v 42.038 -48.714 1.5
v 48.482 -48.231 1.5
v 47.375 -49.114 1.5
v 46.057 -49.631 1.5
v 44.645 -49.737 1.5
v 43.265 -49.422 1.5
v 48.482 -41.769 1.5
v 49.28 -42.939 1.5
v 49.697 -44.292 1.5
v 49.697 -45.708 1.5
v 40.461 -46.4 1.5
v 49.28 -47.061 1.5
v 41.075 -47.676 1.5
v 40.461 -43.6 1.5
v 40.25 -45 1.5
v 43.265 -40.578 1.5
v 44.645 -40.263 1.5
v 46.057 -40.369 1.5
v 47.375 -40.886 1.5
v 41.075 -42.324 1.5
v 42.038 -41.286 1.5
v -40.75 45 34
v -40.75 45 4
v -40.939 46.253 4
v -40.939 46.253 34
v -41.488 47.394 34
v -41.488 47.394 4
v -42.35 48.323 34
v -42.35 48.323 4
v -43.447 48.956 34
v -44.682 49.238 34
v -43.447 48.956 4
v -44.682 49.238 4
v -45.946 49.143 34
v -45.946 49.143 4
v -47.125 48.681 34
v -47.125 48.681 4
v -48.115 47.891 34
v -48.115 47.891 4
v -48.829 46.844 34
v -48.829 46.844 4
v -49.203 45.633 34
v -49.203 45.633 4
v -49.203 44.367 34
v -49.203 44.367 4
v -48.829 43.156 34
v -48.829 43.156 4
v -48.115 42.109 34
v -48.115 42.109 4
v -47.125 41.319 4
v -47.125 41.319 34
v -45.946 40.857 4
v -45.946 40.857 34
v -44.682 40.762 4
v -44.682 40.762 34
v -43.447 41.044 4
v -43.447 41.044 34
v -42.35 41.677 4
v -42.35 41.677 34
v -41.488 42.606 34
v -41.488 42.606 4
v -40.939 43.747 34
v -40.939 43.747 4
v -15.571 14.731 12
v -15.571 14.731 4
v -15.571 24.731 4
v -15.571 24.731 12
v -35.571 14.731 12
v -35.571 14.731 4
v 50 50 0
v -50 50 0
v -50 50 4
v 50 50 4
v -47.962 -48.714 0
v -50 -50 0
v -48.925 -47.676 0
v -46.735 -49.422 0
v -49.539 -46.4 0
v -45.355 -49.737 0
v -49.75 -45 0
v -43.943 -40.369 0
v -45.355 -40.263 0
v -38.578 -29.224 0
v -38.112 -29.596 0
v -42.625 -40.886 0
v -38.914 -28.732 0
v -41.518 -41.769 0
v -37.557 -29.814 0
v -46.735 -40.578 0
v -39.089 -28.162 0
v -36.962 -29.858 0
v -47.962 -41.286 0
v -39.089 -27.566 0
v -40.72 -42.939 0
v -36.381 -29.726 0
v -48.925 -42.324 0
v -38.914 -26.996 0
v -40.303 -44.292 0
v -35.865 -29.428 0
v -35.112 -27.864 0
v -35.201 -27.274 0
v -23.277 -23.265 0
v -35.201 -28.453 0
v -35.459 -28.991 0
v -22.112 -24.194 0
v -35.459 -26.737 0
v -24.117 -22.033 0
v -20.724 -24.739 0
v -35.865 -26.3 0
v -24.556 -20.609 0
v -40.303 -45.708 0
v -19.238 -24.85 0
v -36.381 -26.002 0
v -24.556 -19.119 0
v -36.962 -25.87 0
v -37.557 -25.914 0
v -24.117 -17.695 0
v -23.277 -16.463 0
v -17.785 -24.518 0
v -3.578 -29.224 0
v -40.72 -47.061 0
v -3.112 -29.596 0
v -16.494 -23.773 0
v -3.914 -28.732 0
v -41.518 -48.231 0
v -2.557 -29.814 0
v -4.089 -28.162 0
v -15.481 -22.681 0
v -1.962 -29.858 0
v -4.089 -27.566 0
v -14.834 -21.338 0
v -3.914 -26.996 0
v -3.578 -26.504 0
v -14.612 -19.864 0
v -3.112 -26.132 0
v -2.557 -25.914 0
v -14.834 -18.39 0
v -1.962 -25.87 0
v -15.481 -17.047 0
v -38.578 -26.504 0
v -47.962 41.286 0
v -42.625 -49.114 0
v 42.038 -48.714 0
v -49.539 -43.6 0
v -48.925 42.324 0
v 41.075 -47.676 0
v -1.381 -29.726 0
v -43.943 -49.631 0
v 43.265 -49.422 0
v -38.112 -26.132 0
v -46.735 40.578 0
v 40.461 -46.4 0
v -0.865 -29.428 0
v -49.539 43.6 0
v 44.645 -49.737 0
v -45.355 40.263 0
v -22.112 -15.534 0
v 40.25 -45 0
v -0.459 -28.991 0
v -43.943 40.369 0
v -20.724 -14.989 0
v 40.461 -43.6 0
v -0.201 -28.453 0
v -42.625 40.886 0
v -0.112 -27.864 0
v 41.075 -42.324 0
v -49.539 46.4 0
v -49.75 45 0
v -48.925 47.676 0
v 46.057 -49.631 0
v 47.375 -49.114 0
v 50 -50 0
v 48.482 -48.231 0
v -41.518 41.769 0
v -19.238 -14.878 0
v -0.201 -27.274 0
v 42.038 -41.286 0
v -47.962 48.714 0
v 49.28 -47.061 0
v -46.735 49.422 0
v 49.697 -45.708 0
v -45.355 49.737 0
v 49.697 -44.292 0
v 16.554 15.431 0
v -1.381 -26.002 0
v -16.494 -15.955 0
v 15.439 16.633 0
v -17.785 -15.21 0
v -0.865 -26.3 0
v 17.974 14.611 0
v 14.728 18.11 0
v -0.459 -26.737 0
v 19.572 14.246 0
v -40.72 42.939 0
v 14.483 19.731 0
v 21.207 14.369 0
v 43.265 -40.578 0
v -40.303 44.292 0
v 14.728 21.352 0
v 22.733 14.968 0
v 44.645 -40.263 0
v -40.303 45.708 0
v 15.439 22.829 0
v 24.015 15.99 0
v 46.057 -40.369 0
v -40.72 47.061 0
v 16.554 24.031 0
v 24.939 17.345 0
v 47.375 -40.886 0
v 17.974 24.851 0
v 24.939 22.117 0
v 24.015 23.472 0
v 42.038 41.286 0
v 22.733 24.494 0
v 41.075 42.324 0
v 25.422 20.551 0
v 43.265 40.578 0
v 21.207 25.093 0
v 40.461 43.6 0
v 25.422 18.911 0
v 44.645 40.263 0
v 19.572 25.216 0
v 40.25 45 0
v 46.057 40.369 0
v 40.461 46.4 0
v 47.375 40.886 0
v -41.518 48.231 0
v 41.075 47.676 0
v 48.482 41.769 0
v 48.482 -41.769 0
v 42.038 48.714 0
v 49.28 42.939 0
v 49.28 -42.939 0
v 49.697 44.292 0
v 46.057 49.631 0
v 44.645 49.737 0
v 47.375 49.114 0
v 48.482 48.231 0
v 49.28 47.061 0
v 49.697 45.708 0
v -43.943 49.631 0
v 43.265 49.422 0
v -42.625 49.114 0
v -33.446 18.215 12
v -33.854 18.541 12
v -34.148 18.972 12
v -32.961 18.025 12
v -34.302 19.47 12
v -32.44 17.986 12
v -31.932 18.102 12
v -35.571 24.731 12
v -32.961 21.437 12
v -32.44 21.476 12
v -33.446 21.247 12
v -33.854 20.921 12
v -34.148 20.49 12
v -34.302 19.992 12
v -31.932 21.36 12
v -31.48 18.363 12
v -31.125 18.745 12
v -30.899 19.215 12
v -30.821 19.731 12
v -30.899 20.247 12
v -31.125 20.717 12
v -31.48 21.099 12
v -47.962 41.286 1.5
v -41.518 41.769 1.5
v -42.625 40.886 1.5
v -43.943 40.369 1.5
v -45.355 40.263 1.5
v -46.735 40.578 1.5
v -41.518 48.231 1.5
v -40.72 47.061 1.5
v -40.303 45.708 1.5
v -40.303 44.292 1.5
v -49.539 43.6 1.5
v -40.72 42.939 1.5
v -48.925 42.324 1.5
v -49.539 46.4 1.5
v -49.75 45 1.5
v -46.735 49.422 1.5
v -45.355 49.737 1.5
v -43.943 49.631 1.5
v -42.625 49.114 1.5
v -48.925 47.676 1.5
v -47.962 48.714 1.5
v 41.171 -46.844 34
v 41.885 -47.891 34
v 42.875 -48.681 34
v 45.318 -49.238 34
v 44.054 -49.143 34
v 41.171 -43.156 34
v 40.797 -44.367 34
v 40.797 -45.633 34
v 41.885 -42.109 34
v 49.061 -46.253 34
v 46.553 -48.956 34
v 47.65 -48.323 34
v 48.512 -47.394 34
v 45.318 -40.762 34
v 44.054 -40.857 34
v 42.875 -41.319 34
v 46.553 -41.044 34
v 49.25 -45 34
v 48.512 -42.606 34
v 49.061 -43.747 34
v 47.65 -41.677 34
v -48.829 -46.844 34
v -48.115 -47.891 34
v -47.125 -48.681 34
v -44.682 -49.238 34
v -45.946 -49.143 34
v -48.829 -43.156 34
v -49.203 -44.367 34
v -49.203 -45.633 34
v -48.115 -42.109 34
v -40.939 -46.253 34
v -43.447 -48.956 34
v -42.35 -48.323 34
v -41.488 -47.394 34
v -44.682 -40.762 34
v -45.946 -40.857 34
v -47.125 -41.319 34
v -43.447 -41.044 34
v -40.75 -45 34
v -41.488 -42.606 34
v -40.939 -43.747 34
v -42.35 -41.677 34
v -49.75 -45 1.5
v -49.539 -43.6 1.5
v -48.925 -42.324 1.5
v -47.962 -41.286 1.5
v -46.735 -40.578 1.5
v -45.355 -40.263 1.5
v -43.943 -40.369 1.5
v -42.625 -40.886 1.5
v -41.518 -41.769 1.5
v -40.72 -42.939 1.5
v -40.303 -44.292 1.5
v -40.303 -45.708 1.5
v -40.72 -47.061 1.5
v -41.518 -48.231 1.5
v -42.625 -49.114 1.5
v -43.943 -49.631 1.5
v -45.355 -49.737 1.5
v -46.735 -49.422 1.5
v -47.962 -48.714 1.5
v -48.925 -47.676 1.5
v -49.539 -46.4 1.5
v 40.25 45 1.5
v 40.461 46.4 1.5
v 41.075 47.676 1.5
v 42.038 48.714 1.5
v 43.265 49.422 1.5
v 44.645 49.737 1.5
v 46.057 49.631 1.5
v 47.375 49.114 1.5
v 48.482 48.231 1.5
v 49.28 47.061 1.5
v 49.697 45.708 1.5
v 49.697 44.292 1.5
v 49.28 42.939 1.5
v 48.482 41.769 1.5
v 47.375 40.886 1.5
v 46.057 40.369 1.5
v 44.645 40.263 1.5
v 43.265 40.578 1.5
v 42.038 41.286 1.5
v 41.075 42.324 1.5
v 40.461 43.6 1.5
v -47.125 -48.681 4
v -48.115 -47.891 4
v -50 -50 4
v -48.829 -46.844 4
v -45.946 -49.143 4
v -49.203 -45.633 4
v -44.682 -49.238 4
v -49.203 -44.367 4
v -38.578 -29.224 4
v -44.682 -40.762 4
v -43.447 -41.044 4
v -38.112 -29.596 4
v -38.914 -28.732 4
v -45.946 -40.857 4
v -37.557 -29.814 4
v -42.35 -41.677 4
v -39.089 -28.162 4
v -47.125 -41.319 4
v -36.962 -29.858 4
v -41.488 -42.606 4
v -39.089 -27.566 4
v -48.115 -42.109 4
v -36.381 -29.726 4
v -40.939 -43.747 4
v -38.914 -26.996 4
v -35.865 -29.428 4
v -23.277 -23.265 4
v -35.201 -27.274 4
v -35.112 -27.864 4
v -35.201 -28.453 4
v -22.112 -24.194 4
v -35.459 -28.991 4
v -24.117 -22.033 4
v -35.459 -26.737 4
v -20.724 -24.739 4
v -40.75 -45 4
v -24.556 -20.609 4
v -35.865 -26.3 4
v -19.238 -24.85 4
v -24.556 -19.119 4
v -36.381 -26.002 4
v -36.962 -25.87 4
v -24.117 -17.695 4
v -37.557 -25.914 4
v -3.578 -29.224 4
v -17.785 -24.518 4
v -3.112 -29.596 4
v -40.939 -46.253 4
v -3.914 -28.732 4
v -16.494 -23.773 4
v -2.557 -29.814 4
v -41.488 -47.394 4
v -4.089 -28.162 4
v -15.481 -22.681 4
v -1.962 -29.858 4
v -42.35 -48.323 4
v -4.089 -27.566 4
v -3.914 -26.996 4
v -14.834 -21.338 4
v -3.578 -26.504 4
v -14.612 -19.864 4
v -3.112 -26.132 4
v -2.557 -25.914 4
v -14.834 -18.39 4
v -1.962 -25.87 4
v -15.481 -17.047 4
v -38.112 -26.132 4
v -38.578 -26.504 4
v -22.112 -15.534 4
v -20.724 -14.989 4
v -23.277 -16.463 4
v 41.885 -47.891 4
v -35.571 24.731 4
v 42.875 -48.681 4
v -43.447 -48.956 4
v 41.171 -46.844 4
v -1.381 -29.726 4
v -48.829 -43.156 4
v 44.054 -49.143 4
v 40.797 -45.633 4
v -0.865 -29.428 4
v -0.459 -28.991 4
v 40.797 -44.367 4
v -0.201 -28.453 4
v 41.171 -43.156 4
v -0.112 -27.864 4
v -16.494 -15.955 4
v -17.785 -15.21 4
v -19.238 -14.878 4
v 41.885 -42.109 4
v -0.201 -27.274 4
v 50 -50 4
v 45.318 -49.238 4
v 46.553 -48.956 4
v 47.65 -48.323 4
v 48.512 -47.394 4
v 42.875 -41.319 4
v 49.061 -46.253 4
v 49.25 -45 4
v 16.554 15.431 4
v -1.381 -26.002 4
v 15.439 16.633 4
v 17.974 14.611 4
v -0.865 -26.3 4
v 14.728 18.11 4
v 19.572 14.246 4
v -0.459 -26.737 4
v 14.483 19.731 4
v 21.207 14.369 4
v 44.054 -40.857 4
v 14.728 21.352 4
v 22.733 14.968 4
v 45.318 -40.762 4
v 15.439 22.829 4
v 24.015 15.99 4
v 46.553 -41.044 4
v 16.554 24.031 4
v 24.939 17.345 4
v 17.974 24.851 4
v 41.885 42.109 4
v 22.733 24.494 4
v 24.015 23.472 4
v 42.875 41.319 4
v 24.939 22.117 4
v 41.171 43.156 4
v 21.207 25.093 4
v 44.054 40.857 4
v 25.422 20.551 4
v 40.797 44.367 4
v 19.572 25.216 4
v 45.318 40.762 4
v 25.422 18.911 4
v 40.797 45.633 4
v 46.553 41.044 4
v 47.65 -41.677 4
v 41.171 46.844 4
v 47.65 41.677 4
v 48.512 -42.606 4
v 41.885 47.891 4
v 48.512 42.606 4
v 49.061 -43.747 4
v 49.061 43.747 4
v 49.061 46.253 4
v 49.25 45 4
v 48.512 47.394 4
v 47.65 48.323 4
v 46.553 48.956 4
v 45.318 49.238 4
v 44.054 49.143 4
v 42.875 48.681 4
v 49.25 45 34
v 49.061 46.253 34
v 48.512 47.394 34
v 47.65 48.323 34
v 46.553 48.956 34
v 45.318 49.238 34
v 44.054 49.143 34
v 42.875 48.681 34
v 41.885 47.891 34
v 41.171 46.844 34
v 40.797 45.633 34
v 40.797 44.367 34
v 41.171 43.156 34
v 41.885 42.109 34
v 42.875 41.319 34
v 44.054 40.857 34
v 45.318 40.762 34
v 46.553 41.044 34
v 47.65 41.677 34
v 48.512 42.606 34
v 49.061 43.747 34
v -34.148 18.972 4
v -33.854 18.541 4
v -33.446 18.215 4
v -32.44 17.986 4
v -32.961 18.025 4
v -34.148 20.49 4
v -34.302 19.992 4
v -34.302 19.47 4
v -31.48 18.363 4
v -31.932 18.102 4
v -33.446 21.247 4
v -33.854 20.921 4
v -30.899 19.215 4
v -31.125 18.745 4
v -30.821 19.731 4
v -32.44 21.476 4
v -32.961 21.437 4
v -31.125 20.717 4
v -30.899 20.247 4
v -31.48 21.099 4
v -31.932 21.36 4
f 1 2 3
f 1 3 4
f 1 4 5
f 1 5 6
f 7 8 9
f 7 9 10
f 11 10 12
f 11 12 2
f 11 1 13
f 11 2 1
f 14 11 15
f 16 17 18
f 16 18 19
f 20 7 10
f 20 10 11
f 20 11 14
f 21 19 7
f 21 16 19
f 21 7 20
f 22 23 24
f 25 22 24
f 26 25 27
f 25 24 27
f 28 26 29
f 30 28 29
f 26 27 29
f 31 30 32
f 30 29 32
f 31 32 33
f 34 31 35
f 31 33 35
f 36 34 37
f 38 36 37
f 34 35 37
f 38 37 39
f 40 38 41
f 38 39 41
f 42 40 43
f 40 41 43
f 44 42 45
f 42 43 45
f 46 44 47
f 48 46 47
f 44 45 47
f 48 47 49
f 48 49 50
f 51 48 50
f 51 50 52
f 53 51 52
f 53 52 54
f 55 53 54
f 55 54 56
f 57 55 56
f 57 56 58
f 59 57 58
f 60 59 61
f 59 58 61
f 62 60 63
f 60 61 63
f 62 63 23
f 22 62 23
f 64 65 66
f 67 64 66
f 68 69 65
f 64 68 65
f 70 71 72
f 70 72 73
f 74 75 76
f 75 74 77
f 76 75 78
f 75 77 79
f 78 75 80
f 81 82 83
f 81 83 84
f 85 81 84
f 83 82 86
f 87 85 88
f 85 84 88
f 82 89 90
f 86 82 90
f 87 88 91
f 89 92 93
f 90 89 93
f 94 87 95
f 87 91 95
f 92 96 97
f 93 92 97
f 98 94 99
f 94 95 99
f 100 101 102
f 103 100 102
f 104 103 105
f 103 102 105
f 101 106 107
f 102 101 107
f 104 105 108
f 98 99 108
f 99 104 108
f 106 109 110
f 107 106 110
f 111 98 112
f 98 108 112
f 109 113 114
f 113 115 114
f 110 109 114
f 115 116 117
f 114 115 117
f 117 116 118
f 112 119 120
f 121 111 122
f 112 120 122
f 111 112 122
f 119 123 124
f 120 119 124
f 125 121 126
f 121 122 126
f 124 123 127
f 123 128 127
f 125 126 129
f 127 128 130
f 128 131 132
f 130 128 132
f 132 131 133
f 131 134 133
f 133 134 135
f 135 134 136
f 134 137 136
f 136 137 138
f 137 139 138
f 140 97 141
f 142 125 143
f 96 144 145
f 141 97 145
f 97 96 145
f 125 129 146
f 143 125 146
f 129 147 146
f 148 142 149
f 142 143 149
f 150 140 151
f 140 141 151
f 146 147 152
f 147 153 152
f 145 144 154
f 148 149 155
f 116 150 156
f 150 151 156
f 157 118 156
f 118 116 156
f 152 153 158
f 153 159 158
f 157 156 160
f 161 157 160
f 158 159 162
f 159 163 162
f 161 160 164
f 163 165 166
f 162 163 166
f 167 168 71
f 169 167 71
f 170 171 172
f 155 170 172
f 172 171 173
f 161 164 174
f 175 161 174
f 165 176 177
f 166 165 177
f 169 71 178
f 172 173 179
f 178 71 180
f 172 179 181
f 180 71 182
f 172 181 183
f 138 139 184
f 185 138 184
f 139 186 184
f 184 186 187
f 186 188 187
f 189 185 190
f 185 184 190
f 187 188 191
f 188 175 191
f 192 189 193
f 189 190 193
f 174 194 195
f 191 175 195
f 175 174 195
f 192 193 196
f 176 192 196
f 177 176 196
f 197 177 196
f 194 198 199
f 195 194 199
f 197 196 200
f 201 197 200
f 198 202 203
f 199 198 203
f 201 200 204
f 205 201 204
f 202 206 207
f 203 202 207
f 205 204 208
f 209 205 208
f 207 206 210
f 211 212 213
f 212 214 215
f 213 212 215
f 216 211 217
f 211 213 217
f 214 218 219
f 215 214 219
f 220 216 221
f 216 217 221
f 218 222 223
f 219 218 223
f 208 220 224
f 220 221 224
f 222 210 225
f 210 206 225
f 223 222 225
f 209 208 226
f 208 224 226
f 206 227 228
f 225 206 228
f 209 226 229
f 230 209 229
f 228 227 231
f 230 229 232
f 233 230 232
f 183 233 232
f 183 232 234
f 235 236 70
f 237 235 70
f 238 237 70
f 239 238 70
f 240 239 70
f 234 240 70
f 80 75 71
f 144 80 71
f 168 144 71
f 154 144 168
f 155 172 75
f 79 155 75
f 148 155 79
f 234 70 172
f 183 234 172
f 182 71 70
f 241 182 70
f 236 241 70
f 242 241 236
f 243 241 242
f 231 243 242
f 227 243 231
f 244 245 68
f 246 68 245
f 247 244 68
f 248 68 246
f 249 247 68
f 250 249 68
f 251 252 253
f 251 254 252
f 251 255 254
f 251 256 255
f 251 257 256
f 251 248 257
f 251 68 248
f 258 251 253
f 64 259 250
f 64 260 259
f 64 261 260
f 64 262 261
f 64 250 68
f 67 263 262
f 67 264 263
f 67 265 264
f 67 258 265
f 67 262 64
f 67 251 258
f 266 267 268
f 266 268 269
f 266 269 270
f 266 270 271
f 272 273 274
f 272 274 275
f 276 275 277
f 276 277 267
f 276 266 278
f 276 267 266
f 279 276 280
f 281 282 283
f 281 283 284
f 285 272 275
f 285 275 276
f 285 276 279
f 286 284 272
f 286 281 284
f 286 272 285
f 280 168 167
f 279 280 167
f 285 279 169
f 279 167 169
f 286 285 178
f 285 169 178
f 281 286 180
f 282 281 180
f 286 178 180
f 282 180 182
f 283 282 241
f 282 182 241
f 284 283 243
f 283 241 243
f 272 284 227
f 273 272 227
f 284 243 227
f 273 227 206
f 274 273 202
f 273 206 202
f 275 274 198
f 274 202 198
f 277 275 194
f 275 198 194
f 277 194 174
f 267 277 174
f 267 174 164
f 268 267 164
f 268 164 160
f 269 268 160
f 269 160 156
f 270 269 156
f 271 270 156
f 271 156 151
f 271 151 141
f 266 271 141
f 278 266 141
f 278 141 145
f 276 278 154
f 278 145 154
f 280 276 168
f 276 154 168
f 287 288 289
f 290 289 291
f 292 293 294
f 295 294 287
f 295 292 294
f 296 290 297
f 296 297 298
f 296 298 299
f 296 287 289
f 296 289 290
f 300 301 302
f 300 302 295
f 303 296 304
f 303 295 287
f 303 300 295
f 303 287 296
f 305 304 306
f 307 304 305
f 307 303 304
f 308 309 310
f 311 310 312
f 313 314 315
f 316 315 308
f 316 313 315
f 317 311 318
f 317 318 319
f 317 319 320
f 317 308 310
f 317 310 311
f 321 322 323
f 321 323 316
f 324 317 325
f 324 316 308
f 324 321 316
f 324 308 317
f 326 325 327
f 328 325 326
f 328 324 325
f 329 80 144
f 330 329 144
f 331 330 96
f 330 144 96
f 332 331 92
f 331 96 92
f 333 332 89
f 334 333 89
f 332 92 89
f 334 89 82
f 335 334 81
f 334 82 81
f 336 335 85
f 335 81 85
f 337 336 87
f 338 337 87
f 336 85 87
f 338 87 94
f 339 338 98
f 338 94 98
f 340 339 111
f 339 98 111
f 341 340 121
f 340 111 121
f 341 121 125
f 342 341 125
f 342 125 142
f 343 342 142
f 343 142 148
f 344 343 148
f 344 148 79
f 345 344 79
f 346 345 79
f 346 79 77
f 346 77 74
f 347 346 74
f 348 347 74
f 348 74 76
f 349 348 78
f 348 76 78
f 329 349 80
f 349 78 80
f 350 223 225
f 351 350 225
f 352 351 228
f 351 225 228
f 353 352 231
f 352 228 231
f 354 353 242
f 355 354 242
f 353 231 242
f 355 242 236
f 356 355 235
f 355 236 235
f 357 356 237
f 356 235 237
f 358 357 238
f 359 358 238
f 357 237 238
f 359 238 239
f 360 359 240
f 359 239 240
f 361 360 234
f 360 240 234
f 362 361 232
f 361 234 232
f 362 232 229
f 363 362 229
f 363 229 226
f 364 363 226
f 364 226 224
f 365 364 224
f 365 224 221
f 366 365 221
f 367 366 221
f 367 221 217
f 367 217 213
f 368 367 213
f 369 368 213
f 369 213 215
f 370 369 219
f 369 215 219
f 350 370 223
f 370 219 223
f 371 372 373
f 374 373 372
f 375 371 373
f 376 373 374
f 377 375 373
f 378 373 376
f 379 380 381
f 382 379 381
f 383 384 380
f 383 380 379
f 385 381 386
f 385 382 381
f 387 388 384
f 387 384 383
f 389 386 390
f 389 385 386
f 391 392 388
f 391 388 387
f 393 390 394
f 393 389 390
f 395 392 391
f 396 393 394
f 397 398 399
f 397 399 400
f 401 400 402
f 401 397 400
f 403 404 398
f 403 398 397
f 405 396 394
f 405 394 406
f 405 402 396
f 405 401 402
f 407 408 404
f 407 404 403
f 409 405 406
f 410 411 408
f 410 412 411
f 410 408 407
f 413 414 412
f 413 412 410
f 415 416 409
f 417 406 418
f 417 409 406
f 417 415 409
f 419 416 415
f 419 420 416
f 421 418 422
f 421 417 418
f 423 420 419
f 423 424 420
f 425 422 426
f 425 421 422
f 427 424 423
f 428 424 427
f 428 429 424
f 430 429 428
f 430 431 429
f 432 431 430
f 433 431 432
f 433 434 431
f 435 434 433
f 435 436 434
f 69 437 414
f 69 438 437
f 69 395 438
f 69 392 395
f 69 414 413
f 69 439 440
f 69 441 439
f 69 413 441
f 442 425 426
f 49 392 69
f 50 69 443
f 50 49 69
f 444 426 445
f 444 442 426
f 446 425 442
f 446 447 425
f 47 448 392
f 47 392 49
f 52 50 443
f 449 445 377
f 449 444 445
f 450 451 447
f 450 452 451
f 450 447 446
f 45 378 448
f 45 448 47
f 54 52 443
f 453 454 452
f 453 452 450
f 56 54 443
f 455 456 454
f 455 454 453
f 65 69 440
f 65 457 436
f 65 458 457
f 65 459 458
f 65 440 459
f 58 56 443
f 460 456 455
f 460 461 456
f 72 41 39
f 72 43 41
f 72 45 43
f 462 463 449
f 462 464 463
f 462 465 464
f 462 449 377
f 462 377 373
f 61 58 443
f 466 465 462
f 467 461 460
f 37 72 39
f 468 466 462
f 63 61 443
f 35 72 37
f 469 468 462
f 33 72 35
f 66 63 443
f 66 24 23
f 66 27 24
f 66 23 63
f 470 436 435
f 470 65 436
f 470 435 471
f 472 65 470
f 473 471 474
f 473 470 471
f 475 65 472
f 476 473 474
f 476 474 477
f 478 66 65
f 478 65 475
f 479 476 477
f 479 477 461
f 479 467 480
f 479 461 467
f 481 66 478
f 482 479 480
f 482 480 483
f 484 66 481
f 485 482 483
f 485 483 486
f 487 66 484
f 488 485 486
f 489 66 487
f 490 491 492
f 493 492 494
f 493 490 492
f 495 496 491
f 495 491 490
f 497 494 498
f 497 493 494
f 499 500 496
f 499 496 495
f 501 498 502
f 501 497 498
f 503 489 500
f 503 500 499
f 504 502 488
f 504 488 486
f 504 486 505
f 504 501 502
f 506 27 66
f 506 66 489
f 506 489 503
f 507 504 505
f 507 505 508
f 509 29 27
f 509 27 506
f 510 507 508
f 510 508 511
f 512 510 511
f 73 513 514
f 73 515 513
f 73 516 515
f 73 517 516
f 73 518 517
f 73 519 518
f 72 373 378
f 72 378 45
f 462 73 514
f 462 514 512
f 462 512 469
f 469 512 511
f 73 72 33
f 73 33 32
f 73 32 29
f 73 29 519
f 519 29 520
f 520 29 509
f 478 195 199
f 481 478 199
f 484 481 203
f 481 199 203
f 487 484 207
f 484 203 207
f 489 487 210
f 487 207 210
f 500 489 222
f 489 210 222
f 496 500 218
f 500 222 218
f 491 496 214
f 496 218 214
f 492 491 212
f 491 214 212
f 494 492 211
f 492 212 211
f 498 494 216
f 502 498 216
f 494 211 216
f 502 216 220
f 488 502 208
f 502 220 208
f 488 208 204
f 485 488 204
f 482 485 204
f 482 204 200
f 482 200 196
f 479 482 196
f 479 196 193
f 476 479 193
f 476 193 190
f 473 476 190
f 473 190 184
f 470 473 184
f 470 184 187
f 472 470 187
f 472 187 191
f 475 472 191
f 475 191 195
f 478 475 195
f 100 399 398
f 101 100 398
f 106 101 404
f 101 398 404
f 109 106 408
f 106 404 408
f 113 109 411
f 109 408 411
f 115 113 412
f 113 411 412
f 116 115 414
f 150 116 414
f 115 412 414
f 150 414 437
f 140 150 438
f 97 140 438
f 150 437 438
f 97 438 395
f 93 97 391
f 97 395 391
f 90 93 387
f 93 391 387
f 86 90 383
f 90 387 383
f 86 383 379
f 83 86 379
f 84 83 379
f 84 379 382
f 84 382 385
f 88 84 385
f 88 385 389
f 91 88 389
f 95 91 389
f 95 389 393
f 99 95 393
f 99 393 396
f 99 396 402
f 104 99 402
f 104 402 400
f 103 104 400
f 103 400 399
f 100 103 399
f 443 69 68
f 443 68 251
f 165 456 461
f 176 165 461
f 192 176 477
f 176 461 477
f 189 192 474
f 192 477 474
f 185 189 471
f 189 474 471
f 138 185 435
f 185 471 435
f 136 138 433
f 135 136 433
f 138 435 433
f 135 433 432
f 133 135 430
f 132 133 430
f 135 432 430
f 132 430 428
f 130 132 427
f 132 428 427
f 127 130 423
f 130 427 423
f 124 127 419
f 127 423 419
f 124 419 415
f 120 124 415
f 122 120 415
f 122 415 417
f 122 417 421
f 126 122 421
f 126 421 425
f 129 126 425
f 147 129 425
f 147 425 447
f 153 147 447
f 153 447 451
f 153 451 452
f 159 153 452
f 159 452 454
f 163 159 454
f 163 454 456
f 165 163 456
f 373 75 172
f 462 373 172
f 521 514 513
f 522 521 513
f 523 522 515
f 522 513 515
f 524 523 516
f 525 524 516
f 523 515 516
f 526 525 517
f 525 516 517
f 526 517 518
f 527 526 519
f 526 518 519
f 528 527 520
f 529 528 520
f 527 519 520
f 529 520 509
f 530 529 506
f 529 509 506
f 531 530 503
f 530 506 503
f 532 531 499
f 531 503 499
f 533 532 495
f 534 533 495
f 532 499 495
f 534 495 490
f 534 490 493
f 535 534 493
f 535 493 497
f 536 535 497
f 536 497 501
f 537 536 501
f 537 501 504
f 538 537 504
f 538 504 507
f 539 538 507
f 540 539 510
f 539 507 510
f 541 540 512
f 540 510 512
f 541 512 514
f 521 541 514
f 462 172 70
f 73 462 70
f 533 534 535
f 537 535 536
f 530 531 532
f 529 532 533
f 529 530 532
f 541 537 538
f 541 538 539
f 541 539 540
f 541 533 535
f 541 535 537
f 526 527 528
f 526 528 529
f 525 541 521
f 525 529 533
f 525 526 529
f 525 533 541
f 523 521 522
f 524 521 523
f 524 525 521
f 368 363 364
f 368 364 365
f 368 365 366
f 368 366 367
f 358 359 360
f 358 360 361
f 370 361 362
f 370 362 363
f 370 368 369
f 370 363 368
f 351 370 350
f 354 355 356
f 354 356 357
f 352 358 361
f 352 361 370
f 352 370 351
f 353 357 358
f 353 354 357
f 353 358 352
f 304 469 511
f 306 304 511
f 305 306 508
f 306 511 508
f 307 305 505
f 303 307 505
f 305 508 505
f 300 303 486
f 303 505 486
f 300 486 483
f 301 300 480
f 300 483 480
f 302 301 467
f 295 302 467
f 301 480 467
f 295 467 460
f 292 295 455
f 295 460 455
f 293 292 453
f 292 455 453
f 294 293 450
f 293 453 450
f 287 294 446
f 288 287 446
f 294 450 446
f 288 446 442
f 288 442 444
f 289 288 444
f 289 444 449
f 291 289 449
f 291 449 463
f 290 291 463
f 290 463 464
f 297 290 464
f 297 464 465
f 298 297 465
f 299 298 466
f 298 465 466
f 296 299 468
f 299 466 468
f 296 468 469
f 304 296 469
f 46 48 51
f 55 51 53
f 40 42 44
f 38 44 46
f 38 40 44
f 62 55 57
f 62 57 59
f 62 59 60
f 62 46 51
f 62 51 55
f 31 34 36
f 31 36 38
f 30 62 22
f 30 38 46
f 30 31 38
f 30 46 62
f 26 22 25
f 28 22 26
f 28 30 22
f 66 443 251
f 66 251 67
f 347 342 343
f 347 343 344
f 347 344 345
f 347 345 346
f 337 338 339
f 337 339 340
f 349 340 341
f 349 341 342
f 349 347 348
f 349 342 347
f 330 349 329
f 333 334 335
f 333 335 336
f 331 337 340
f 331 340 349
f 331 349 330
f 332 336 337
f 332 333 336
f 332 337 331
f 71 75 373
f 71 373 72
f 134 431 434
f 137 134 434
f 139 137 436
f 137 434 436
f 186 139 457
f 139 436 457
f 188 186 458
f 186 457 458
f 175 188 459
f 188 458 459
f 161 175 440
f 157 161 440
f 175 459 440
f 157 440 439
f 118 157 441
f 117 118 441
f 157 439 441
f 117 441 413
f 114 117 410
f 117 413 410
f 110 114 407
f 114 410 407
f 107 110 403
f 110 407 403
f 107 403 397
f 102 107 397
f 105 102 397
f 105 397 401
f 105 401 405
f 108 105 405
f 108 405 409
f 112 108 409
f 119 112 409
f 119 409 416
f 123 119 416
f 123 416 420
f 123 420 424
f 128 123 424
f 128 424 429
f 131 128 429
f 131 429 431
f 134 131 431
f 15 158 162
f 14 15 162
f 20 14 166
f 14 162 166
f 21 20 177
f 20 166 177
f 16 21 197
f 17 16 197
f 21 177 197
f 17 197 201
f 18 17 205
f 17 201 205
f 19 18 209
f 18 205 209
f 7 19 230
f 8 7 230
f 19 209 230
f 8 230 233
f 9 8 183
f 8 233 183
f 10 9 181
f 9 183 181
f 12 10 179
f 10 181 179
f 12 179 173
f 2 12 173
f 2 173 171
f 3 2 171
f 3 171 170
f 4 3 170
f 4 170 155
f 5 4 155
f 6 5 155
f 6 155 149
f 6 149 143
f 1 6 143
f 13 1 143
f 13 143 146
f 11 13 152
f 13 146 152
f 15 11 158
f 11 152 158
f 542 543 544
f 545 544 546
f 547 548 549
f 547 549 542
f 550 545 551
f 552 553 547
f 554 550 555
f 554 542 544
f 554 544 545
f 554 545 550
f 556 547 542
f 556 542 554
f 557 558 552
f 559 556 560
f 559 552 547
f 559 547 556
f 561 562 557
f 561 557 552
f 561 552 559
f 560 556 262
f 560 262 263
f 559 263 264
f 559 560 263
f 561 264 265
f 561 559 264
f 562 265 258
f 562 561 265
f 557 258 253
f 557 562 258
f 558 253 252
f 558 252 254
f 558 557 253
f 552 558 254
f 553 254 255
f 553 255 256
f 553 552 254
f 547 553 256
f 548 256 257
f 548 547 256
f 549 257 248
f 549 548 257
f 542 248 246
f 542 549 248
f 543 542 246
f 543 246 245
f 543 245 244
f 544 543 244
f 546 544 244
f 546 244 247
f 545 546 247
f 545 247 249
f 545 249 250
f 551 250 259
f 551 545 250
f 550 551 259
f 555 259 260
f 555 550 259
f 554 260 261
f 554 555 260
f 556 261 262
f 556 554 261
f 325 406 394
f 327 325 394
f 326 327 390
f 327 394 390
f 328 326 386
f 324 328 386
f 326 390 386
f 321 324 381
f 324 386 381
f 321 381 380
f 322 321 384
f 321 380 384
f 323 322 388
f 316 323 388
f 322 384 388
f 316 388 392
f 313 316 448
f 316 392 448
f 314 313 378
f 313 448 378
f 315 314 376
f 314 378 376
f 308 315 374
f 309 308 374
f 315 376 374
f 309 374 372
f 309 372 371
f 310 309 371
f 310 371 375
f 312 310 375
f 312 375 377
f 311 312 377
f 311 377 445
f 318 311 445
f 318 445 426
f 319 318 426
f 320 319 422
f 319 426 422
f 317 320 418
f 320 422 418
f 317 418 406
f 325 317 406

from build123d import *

# Parameters (mm, degrees)
SKETCH1_W               = 100
SKETCH1_H               = 100
BOSS_EXTRUDE1_DEPTH     = 4
SKETCH2_R               = 4.25
BOSS_EXTRUDE2_DEPTH     = 30
SKETCH4_R               = 4.75
CUT_EXTRUDE1_DEPTH      = 1.5
SKETCH5_R               = 2
SKETCH5_R_2             = 5
CUT_EXTRUDE2_DEPTH      = 31
CUT_EXTRUDE2_DEPTH_BACK = 5
SKETCH6_W               = 20
SKETCH6_H               = 10
SKETCH6_R               = 1.75
BOSS_EXTRUDE3_DEPTH     = 8
SKETCH7_R               = 5.5
CUT_EXTRUDE3_DEPTH      = 8


with BuildPart() as part:
    # Sketch1 → Boss-Extrude1 (new body)
    with BuildSketch(Plane.XY):
        Rectangle(SKETCH1_W, SKETCH1_H)
    extrude(amount=BOSS_EXTRUDE1_DEPTH)

    # Sketch2 → Boss-Extrude2 (add)
    with BuildSketch(Plane.XY.offset(4)):
        with Locations((45, 45)):
            Circle(SKETCH2_R)
        with Locations((-45, 45)):
            Circle(SKETCH2_R)
        with Locations((-45, -45)):
            Circle(SKETCH2_R)
        with Locations((45, -45)):
            Circle(SKETCH2_R)
    extrude(amount=BOSS_EXTRUDE2_DEPTH)

    # Sketch4 → Cut-Extrude1 (cut)
    with BuildSketch(Plane(origin=(0, 0, 0), x_dir=(-1, 0, 0), z_dir=(0, 0, -1))):
        with Locations((-45, 45)):
            Circle(SKETCH4_R)
        with Locations((45, 45)):
            Circle(SKETCH4_R)
        with Locations((-45, -45)):
            Circle(SKETCH4_R)
        with Locations((45, -45)):
            Circle(SKETCH4_R)
    extrude(amount=-CUT_EXTRUDE1_DEPTH, mode=Mode.SUBTRACT)

    # Sketch5 → Cut-Extrude2 (cut, two sides)
    with BuildSketch(Plane(origin=(-38.404344239, -79.614153906, 4), x_dir=(1, 0, 0), z_dir=(0, 0, 1))) as cut_extrude2_sk:
        with Locations((36.292632212, 51.750208167)):
            Circle(SKETCH5_R)
        with Locations((1.292632212, 51.750208167)):
            Circle(SKETCH5_R)
        with Locations((18.792632212, 59.750208167)):
            Circle(SKETCH5_R_2)
    extrude(amount=CUT_EXTRUDE2_DEPTH, mode=Mode.SUBTRACT)
    extrude(cut_extrude2_sk.sketch, amount=-CUT_EXTRUDE2_DEPTH_BACK, mode=Mode.SUBTRACT)

    # Sketch6 → Boss-Extrude3 (add)
    with BuildSketch(Plane.XY.offset(4)):
        with Locations((-25.571153041, 19.73100851)):
            Rectangle(SKETCH6_W, SKETCH6_H)
        with Locations((-32.571153041, 19.73100851)):
            Circle(SKETCH6_R, mode=Mode.SUBTRACT)
    extrude(amount=BOSS_EXTRUDE3_DEPTH)

    # Sketch7 → Cut-Extrude3 (cut)
    with BuildSketch(Plane(origin=(-38.404344239, -79.614153906, 0), x_dir=(-1, 0, 0), z_dir=(0, 0, -1))):
        with Locations((-58.387586461, 99.345162416)):
            Circle(SKETCH7_R)
    extrude(amount=-CUT_EXTRUDE3_DEPTH, mode=Mode.SUBTRACT)


solid = part.part
